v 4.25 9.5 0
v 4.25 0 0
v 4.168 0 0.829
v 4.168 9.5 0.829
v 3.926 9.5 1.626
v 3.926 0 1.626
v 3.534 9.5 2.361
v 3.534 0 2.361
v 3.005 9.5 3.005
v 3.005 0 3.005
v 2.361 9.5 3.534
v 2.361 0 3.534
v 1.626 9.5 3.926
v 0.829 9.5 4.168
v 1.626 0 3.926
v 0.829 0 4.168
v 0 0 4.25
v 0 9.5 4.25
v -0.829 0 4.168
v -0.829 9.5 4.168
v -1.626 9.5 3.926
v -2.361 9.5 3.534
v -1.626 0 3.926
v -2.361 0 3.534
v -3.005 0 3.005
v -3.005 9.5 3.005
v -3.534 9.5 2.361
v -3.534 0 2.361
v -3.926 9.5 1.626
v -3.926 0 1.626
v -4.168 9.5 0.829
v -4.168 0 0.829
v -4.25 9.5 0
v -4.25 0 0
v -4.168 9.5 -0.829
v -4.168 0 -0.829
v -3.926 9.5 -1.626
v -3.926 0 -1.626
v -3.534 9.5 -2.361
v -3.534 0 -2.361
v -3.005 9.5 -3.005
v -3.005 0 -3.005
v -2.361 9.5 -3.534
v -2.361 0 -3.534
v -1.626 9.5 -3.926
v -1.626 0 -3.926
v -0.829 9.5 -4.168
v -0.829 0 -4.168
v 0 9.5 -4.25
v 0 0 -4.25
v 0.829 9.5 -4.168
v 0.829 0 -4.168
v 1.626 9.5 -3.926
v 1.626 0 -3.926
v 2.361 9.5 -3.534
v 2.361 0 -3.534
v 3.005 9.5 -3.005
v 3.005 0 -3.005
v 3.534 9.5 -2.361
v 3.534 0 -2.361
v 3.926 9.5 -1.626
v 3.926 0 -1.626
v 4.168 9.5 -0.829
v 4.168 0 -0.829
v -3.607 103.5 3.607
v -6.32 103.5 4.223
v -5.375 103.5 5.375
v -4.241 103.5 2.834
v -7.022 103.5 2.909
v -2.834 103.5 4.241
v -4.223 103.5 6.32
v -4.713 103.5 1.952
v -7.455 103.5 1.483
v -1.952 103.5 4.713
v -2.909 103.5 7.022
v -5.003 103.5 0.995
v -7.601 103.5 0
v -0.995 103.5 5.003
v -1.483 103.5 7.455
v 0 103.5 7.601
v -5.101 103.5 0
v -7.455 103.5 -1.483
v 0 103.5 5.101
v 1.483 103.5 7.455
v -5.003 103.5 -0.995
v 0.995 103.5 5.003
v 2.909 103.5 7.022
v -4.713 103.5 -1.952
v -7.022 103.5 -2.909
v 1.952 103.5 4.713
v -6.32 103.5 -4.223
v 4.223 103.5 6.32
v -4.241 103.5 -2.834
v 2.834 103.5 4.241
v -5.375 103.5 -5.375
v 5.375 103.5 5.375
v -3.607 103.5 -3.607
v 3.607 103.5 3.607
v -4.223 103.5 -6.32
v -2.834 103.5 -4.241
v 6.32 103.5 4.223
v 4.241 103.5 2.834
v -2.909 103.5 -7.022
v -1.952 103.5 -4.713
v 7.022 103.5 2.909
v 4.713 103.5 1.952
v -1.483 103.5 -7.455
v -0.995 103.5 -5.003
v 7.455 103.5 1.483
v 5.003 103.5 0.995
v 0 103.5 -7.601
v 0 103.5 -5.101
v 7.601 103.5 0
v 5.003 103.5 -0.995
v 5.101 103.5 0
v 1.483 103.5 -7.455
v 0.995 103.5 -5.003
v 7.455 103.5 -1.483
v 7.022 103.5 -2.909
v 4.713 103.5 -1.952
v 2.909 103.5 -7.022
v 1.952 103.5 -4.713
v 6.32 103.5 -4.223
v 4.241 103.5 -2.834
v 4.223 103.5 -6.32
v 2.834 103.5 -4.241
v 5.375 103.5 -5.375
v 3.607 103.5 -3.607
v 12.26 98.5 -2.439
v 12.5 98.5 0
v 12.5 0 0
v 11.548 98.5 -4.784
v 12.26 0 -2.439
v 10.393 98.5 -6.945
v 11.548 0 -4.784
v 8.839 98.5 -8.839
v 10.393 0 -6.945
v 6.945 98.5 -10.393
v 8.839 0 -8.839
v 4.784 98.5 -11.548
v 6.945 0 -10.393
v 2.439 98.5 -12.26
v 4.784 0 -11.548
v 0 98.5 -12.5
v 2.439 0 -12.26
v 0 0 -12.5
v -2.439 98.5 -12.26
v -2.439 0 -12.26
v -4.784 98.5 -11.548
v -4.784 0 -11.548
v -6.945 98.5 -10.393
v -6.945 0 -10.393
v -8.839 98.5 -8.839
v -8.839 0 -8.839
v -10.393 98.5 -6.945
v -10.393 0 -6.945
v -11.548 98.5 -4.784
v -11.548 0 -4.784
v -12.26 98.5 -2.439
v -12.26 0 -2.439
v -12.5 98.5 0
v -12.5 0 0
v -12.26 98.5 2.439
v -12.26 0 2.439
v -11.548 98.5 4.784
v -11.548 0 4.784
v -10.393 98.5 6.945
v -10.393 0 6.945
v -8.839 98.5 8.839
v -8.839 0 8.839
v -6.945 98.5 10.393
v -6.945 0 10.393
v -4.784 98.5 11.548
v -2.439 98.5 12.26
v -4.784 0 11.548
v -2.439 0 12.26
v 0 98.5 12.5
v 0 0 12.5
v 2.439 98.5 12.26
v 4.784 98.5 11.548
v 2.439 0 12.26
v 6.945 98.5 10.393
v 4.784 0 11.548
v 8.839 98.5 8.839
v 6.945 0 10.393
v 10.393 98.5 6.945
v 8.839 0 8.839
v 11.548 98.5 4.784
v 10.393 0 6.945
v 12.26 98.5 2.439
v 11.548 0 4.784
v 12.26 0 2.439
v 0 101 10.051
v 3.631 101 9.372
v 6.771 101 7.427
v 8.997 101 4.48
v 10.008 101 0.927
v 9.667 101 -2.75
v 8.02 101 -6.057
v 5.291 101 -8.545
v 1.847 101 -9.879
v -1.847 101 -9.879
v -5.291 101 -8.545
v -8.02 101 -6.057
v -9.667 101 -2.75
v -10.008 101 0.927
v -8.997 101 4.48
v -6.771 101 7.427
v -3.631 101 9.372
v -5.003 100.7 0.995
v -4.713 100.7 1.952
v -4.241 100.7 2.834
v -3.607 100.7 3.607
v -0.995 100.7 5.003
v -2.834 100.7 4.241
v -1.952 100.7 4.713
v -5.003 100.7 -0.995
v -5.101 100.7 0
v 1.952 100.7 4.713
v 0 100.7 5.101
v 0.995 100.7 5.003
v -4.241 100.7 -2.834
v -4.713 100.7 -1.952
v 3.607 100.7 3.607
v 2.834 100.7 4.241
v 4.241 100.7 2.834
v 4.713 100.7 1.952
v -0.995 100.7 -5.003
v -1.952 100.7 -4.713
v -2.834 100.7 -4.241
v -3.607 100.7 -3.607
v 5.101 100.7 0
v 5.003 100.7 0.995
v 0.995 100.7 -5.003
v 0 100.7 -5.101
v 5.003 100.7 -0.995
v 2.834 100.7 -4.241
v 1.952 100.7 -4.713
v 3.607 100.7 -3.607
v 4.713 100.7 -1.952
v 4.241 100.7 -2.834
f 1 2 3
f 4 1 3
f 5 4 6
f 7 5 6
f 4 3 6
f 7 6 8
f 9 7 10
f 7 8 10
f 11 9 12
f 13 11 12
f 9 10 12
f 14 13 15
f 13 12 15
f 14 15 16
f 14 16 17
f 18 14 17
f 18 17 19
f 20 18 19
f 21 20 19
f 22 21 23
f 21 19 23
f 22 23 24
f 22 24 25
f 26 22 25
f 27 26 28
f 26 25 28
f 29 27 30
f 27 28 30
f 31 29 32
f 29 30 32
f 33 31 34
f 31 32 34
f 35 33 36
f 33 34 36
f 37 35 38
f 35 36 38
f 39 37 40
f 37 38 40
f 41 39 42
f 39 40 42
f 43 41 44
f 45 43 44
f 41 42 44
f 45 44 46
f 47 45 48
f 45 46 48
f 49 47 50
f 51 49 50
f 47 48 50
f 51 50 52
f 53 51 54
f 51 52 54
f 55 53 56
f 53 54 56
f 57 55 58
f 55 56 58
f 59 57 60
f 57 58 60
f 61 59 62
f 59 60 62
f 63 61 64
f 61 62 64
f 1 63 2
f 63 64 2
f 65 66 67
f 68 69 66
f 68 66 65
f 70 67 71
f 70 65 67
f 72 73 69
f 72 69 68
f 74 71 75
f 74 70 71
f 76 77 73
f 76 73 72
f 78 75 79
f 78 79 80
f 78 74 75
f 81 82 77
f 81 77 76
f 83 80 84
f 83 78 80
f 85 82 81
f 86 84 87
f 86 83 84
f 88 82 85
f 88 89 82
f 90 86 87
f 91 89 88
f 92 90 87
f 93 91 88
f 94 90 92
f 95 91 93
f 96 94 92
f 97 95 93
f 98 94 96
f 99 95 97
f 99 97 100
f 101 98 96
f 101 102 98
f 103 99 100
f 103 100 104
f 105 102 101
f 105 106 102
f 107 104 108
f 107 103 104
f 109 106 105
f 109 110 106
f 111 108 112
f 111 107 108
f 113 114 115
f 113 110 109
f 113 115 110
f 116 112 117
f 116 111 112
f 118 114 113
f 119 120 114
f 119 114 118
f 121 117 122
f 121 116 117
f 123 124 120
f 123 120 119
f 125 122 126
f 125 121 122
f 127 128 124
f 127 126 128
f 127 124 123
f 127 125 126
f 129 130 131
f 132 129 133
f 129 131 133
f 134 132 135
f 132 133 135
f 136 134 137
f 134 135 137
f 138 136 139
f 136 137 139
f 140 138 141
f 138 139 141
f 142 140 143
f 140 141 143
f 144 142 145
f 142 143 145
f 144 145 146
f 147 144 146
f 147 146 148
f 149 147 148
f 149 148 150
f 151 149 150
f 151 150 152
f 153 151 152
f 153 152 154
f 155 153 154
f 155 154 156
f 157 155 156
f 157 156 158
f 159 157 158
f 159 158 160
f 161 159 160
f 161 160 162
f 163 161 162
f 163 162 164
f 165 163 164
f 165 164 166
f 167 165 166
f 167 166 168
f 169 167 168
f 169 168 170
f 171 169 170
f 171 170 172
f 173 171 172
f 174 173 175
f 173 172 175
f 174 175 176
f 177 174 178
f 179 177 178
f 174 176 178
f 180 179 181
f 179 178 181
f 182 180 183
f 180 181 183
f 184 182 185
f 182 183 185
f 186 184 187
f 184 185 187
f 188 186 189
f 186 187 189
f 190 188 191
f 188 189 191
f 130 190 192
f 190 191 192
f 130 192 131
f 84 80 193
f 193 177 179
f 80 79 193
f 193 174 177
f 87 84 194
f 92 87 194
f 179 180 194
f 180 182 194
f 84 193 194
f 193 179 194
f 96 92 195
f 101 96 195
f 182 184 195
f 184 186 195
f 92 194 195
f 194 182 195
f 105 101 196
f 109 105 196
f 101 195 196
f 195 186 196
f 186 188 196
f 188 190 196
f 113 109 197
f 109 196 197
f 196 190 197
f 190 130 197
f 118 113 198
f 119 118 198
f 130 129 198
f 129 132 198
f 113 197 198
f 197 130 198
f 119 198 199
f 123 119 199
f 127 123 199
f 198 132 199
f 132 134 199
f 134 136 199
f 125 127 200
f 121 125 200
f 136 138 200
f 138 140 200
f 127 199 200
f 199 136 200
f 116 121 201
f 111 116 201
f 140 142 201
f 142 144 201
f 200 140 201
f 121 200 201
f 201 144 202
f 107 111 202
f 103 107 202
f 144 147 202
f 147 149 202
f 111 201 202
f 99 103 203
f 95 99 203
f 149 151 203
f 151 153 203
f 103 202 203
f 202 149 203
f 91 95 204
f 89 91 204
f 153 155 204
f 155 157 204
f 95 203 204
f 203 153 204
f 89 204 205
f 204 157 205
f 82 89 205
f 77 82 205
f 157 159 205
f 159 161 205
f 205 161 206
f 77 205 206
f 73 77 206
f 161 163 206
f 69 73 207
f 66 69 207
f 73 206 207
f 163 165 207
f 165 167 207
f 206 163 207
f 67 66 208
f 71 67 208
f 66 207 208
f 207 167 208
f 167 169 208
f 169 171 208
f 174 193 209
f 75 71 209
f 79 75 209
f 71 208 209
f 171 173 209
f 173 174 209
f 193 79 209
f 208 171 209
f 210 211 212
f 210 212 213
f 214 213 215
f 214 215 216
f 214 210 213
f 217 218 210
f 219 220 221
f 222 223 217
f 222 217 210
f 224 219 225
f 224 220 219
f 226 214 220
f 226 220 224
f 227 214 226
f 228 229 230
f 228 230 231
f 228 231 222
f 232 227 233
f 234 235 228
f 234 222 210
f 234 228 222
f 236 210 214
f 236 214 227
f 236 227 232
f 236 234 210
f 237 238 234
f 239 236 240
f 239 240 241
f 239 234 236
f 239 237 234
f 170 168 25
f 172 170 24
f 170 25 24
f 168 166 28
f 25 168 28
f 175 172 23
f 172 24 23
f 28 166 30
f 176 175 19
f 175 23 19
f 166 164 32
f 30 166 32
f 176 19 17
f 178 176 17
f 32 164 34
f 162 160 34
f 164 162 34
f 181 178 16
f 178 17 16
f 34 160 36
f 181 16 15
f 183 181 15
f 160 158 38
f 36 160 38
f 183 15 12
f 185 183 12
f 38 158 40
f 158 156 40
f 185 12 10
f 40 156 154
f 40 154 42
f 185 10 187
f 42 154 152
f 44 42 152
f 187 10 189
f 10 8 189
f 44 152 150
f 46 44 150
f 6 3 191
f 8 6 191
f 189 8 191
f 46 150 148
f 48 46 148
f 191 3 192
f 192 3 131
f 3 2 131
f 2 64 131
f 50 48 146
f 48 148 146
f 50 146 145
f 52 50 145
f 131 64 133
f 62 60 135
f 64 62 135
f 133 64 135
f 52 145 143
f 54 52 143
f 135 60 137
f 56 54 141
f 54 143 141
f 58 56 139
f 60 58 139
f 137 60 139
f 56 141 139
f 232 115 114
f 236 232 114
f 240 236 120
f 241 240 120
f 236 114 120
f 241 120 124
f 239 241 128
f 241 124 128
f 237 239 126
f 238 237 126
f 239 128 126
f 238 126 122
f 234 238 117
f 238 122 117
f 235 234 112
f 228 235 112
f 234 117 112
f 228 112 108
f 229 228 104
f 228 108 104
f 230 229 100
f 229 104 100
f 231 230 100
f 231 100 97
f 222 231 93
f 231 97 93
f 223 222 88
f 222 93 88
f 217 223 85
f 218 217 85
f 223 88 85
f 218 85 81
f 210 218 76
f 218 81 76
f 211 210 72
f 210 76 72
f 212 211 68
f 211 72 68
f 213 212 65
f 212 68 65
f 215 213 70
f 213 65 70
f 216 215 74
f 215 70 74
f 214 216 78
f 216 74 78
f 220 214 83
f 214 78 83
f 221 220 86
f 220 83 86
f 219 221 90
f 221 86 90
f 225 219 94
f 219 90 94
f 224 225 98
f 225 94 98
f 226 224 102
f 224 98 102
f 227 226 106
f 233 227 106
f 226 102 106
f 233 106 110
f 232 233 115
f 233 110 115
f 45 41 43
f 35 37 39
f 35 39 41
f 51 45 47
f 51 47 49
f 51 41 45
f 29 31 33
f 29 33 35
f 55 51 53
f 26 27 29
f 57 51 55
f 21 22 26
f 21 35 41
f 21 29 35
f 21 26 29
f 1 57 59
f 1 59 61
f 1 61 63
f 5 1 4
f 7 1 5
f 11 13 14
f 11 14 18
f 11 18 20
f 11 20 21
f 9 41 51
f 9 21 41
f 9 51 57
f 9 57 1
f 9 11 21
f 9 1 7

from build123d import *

# Parameters (mm, degrees)
SKETCH1_R           = 12.5
BOSS_EXTRUDE1_DEPTH = 103.5
SKETCH3_R           = 5.101020514
CUT_EXTRUDE1_DEPTH  = 2.8
SKETCH4_R           = 4.25
CUT_EXTRUDE2_DEPTH  = 9.5


with BuildPart() as part:
    # Sketch1 → Boss-Extrude1 (new body)
    with BuildSketch(Plane(origin=(0, 0, 0), x_dir=(1, 0, 0), z_dir=(0, 1, 0))):
        Circle(SKETCH1_R)
    extrude(amount=BOSS_EXTRUDE1_DEPTH)

    # Sketch2 → Cut-Revolve4 (revolve, cut)
    with BuildSketch(Plane(origin=(0, 0, 0), x_dir=(0, 0, -1), z_dir=(1, 0, 0))):
        Polygon((-7.601020514, 103.5), (-12.5, 98.5), (-12.5, 103.5), align=None)
    revolve(axis=Axis((0, 0, 0), (0, 1, 0)), mode=Mode.SUBTRACT)

    # Sketch3 → Cut-Extrude1 (cut)
    with BuildSketch(Plane(origin=(0, 103.5, 0), x_dir=(1, 0, 0), z_dir=(0, 1, 0))):
        Circle(SKETCH3_R)
    extrude(amount=-CUT_EXTRUDE1_DEPTH, mode=Mode.SUBTRACT)

    # Sketch4 → Cut-Extrude2 (cut)
    with BuildSketch(Plane.XZ):
        Circle(SKETCH4_R)
    extrude(amount=-CUT_EXTRUDE2_DEPTH, mode=Mode.SUBTRACT)


solid = part.part
